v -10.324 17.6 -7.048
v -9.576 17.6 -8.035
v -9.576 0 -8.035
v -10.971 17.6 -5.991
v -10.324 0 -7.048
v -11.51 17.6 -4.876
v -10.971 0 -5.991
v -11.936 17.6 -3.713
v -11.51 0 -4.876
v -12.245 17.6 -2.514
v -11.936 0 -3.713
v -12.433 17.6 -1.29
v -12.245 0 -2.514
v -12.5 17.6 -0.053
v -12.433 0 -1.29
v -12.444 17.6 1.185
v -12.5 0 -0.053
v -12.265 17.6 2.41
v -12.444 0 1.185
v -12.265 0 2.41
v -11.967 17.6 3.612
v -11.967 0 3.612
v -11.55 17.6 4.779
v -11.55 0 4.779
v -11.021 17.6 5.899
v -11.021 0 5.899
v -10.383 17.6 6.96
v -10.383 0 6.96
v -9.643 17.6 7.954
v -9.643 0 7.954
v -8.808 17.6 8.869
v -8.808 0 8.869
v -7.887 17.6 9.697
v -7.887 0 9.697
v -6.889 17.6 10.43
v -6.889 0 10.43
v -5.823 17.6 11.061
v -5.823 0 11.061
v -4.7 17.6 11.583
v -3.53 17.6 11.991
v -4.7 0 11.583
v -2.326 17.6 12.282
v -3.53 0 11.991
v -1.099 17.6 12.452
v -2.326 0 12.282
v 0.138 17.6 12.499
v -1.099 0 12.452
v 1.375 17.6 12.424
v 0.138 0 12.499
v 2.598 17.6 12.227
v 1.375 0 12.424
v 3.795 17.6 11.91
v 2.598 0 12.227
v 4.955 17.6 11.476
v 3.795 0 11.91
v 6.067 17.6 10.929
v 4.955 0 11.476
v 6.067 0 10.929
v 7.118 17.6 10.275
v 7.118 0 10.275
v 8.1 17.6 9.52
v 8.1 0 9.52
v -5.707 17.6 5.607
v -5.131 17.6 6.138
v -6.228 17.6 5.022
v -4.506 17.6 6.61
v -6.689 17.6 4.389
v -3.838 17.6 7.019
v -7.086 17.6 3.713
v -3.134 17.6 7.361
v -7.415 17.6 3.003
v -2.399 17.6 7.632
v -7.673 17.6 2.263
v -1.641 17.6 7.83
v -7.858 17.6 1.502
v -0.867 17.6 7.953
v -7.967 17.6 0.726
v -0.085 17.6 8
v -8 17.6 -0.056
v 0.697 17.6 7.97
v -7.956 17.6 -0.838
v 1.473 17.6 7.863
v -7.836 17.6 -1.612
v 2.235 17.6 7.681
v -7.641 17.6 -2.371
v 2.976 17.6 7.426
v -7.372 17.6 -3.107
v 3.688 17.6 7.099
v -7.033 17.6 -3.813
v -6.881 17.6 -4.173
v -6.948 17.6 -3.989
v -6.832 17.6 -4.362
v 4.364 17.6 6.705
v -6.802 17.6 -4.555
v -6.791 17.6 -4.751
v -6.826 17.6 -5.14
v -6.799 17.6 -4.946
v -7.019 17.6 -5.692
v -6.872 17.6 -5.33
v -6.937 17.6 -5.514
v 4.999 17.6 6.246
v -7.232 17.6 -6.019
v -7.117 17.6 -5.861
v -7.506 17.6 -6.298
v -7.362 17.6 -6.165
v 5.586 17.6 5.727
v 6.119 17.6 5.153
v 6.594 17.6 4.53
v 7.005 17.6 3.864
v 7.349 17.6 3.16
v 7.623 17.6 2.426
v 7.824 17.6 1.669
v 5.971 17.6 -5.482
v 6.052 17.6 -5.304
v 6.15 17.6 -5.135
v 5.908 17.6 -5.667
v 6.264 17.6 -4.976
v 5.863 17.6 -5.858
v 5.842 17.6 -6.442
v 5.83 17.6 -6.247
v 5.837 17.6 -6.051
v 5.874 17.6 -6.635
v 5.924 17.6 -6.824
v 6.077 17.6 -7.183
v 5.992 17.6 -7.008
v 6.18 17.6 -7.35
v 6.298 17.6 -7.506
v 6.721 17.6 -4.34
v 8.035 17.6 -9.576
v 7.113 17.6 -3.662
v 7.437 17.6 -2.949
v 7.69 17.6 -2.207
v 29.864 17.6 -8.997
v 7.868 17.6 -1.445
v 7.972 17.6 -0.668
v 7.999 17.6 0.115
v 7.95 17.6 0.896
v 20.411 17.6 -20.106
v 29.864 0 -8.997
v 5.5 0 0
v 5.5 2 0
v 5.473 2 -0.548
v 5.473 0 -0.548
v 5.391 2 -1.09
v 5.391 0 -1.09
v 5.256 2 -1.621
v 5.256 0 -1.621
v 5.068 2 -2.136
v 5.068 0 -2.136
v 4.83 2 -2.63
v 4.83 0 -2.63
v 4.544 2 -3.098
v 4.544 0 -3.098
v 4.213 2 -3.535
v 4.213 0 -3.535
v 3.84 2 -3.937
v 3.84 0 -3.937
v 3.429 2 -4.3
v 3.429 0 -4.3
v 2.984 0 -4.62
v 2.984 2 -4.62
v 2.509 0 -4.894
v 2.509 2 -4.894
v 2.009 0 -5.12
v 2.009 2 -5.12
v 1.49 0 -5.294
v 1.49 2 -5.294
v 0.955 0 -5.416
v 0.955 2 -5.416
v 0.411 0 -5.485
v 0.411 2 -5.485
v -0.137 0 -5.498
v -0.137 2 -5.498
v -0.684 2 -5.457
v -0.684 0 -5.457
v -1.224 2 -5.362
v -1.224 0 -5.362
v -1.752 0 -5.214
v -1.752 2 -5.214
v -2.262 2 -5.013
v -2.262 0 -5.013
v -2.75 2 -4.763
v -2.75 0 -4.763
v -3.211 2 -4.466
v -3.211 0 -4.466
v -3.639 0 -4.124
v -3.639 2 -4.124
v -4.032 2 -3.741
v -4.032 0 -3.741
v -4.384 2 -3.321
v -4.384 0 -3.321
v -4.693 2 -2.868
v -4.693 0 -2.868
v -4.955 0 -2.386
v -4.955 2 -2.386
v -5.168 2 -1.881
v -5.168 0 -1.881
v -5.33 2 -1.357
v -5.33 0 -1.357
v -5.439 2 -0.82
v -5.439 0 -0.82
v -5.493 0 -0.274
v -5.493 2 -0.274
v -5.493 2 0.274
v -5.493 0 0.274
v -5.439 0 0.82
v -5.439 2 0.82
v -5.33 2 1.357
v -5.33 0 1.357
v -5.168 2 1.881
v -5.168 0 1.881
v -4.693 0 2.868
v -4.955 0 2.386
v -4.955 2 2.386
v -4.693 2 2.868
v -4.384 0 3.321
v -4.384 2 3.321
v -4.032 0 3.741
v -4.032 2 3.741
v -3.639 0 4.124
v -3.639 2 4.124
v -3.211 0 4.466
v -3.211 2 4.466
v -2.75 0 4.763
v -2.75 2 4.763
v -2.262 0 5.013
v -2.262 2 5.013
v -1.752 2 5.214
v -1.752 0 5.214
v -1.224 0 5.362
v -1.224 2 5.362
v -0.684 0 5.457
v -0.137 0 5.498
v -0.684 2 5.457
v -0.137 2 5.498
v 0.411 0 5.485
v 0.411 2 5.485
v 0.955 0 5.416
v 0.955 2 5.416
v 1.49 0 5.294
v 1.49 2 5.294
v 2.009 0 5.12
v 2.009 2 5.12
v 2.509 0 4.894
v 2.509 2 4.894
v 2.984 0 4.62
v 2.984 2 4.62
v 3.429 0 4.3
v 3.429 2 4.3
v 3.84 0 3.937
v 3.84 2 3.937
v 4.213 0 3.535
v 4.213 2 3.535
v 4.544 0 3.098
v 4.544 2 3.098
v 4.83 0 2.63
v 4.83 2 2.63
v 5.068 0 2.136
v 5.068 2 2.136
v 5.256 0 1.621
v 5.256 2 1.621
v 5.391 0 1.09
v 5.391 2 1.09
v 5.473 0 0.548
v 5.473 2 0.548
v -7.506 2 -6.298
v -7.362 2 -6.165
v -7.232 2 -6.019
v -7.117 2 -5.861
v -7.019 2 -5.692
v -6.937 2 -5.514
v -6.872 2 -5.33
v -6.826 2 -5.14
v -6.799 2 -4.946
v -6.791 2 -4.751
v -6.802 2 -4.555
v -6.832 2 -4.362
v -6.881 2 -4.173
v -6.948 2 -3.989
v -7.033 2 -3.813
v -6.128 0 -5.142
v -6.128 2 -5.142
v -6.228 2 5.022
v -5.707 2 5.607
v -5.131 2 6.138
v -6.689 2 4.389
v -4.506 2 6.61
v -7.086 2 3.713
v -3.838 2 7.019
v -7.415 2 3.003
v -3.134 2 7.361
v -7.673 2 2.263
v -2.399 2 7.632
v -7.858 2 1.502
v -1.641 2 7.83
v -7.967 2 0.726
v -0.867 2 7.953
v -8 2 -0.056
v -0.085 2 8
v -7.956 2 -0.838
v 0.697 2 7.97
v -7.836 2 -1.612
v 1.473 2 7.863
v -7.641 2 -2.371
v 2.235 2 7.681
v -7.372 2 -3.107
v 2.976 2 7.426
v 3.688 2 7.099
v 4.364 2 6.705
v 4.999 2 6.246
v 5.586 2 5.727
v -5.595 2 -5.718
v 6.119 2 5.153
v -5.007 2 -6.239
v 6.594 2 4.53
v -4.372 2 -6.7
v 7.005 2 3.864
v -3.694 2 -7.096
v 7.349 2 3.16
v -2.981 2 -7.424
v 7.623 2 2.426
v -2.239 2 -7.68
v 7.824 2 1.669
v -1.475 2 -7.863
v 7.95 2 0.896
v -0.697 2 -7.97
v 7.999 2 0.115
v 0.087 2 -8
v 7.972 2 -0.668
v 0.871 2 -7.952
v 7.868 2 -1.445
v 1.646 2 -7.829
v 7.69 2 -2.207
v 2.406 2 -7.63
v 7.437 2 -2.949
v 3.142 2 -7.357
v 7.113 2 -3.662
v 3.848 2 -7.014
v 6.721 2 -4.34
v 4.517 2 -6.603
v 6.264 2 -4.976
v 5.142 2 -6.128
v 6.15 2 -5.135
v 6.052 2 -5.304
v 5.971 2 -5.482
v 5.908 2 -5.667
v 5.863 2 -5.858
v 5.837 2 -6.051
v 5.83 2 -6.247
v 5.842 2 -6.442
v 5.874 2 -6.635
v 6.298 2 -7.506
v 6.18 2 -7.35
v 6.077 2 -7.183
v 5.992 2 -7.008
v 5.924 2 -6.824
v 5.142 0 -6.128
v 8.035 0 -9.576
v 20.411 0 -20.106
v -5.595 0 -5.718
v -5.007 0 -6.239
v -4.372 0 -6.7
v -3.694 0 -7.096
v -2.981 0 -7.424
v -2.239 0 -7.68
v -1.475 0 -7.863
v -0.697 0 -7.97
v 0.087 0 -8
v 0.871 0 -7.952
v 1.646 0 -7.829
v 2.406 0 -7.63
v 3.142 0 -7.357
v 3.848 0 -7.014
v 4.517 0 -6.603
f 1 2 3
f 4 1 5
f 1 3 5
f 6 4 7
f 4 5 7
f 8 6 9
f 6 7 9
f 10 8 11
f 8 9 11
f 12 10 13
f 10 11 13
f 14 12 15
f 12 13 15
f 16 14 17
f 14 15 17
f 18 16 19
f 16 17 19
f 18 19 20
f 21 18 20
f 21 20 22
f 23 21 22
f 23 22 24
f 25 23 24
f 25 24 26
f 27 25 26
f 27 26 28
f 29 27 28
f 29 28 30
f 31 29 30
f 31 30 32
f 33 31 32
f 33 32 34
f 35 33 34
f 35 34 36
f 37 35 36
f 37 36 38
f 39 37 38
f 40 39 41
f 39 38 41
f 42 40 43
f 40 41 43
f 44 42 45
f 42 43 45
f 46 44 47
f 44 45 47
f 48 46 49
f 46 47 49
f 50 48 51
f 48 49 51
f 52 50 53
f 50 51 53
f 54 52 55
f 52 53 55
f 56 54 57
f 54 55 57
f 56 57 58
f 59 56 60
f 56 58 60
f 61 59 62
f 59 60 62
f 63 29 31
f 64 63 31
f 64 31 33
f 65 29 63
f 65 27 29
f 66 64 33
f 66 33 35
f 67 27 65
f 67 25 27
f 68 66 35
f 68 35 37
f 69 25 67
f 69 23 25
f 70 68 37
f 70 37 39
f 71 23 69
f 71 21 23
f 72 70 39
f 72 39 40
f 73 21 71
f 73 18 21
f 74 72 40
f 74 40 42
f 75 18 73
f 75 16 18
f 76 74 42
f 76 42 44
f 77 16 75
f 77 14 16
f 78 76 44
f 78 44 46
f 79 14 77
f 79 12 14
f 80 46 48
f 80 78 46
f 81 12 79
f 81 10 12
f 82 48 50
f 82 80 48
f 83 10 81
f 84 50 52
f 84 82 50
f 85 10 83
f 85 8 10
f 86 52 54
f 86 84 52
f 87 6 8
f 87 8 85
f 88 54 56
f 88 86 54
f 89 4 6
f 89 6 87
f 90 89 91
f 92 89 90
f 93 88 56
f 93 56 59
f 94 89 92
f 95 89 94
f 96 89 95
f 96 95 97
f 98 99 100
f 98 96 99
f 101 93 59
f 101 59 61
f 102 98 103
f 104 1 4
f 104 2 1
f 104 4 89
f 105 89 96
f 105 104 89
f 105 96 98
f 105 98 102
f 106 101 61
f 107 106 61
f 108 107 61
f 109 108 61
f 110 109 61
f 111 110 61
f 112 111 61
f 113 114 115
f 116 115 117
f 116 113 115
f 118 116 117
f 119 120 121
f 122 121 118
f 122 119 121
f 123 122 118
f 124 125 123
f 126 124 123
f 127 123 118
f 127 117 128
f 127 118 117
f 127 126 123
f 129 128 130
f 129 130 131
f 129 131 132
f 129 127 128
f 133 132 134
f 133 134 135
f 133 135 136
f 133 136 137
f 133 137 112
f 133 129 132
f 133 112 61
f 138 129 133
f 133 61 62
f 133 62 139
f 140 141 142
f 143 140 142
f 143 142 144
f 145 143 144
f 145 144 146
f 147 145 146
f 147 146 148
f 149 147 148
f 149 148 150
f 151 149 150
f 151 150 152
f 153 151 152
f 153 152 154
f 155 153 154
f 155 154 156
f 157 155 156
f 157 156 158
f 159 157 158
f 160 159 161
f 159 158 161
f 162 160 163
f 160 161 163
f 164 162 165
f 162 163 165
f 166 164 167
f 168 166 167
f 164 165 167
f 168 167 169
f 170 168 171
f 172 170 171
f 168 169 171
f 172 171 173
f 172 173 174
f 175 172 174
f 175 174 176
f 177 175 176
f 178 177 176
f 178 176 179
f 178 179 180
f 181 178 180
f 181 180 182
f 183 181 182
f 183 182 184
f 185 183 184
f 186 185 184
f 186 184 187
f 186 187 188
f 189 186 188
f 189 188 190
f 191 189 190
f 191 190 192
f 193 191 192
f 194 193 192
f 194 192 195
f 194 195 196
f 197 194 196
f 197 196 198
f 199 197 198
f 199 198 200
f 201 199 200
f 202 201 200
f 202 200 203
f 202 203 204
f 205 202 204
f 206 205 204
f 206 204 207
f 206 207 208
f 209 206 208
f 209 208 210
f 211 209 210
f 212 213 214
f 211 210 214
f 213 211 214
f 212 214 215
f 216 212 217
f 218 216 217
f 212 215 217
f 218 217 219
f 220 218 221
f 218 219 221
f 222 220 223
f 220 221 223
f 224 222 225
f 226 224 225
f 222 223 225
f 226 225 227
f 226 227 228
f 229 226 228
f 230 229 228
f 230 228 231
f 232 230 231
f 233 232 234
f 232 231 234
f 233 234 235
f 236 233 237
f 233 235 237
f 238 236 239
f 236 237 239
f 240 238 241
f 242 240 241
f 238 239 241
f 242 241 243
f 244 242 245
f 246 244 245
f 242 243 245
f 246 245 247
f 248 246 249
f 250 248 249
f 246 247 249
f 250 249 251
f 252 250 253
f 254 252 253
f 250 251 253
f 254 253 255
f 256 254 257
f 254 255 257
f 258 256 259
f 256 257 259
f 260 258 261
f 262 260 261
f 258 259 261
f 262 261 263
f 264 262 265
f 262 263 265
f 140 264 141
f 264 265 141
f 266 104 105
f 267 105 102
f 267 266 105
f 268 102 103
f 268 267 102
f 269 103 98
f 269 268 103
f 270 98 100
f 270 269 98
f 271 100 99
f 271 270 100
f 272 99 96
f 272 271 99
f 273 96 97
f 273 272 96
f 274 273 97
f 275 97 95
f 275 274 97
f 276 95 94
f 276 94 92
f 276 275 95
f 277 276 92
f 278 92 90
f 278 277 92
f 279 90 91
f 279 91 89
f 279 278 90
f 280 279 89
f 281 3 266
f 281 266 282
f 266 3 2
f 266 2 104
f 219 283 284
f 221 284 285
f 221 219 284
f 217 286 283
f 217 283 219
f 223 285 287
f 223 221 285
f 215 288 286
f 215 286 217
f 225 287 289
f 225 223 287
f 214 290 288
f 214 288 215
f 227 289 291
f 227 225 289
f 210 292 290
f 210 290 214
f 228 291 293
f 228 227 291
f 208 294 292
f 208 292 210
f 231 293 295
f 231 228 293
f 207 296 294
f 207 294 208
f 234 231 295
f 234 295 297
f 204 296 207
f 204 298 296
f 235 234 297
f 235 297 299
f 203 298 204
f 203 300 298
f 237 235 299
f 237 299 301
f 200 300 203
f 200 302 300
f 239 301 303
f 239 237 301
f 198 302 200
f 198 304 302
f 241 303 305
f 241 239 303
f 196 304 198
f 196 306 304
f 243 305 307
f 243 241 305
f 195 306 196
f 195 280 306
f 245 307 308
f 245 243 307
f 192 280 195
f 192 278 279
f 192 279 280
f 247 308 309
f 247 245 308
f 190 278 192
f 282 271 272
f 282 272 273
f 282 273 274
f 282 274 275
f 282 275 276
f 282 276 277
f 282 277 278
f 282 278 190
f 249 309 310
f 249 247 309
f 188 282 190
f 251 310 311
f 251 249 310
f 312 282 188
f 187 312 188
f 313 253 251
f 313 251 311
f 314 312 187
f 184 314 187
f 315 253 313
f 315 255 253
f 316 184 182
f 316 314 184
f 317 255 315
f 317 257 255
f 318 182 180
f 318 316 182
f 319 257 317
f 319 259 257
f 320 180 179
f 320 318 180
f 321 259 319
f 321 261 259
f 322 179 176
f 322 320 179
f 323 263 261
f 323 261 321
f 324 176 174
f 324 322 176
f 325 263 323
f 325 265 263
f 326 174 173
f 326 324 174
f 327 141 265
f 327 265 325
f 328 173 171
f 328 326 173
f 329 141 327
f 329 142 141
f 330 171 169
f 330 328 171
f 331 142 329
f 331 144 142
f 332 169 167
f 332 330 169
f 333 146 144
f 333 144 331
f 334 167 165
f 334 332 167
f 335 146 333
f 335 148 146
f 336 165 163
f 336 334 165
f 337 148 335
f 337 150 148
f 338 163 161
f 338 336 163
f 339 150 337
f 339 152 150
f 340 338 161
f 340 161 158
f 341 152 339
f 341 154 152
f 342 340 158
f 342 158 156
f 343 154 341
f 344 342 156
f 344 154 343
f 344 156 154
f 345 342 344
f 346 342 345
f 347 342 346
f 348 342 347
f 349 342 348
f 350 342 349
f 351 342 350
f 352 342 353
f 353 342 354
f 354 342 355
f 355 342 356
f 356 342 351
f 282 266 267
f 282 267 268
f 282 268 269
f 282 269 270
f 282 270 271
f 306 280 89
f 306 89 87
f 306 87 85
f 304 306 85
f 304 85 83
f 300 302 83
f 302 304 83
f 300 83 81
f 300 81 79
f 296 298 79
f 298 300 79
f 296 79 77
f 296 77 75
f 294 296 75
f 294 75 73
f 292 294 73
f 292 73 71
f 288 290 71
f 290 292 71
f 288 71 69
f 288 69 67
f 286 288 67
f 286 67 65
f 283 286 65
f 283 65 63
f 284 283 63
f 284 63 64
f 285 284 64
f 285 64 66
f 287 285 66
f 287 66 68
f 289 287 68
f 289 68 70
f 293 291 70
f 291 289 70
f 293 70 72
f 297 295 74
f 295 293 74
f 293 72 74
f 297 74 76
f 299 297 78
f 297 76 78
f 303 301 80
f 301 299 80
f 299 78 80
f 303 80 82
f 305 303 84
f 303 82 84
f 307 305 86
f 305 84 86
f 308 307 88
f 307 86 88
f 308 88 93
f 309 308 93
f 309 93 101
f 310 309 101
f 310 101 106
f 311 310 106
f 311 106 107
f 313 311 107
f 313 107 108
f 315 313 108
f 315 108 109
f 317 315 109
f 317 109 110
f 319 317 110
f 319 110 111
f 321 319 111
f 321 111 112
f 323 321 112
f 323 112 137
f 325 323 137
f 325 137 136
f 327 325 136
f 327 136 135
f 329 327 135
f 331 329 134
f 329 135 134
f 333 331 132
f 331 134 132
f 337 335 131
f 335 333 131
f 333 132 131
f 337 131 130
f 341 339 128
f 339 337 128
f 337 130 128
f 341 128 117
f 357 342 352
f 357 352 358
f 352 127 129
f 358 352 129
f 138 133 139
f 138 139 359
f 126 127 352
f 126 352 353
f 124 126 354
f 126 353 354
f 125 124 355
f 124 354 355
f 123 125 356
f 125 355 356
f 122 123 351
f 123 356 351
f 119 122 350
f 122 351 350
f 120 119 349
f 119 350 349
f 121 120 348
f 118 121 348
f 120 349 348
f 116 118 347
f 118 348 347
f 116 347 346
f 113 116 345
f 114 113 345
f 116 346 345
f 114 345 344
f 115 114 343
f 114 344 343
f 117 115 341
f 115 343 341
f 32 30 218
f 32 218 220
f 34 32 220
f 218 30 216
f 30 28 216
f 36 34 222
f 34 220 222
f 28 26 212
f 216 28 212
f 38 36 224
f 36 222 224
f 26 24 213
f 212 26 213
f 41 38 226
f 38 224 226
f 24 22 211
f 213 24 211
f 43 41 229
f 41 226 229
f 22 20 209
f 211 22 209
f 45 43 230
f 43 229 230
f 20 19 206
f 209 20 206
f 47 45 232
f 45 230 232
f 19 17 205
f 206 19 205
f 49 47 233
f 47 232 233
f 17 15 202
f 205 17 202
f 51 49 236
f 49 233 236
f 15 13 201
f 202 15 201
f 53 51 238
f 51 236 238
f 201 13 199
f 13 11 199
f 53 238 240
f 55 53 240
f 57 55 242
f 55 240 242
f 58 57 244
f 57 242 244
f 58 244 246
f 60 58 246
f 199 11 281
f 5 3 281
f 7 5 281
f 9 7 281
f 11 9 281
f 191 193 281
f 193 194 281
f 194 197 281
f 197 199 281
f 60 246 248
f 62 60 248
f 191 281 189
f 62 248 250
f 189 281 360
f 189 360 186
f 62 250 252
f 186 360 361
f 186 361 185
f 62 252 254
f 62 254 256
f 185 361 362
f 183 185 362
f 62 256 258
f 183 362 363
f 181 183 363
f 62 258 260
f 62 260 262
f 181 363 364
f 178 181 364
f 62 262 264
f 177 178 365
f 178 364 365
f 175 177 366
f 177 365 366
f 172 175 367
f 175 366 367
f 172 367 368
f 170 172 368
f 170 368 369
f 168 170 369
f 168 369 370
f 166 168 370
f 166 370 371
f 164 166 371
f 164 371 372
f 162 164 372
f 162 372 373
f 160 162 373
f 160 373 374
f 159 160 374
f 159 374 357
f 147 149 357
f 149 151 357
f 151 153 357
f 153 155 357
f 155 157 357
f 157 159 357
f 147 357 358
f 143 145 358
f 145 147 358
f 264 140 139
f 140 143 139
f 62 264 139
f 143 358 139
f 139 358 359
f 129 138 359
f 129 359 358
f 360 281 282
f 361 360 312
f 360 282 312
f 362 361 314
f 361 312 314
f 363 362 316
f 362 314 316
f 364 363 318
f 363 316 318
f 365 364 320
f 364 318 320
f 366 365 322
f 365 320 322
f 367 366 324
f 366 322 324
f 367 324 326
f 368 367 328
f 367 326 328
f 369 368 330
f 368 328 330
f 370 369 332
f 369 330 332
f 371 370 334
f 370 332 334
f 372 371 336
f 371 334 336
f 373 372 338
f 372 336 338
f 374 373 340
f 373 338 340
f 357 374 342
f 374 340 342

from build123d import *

# Parameters (mm, degrees)
SKETCH1_R           = 12.5
BOSS_EXTRUDE1_DEPTH = 17.6
SKETCH2_R           = 5.5
CUT_EXTRUDE1_DEPTH  = 50.8
SKETCH3_R           = 8
CUT_EXTRUDE3_DEPTH  = 15.6
CUT_EXTRUDE4_DEPTH  = 18.6
BOSS_EXTRUDE2_DEPTH = 17.6
FILLET1_R           = 2


with BuildPart() as part:
    # Sketch1 → Boss-Extrude1 (new body)
    with BuildSketch(Plane(origin=(0, 0, 0), x_dir=(1, 0, 0), z_dir=(0, 1, 0))):
        Circle(SKETCH1_R)
    extrude(amount=BOSS_EXTRUDE1_DEPTH)

    # Sketch2 → Cut-Extrude1 (cut)
    with BuildSketch(Plane(origin=(0, 17.6, 0), x_dir=(1, 0, 0), z_dir=(0, 1, 0))):
        Circle(SKETCH2_R)
    extrude(amount=-CUT_EXTRUDE1_DEPTH, mode=Mode.SUBTRACT)

    # Sketch3 → Cut-Extrude3 (cut)
    with BuildSketch(Plane(origin=(0, 17.6, 0), x_dir=(1, 0, 0), z_dir=(0, 1, 0))):
        Circle(SKETCH3_R)
    extrude(amount=-CUT_EXTRUDE3_DEPTH, mode=Mode.SUBTRACT)

    # Sketch4 → Cut-Extrude4 (cut, through all)
    with BuildSketch(Plane(origin=(0, 17.6, 0), x_dir=(1, 0, 0), z_dir=(0, 1, 0))):
        with BuildLine():
            ThreePointArc((-6.128355545, 5.142300877), (-0.697245942, 7.969557585), (5.142300877, 6.128355545))
            Line((5.142300877, 6.128355545), (8.034845121, 9.575555539))
            ThreePointArc((8.034845121, 9.575555539), (-1.089446784, 12.452433726), (-9.575555539, 8.034845121))
            Line((-9.575555539, 8.034845121), (-6.128355545, 5.142300877))
        make_face()
    extrude(amount=-CUT_EXTRUDE4_DEPTH, mode=Mode.SUBTRACT)

    # Sketch5 → Boss-Extrude2 (add, through all)
    with BuildSketch(Plane(origin=(0, 17.6, 0), x_dir=(1, 0, 0), z_dir=(0, 1, 0))):
        with BuildLine():
            Line((29.863521208, 8.997262141), (20.411315049, 20.106230978))
            Line((20.411315049, 20.106230978), (8.034845121, 9.575555539))
            ThreePointArc((8.034845121, 9.575555539), (12.499926406, 0.042893271), (8.100371818, -9.520187835))
            Line((8.100371818, -9.520187835), (29.863521208, 8.997262141))
        make_face()
    extrude(amount=-BOSS_EXTRUDE2_DEPTH)

    # Fillet1
    fillet1_edges = [part.edges().sort_by_distance(p)[0] for p in [
        (5.142300877, 9.8, -6.128355545),
        (-6.128355545, 9.8, -5.142300877),
    ]]
    fillet(fillet1_edges, radius=FILLET1_R)


solid = part.part
